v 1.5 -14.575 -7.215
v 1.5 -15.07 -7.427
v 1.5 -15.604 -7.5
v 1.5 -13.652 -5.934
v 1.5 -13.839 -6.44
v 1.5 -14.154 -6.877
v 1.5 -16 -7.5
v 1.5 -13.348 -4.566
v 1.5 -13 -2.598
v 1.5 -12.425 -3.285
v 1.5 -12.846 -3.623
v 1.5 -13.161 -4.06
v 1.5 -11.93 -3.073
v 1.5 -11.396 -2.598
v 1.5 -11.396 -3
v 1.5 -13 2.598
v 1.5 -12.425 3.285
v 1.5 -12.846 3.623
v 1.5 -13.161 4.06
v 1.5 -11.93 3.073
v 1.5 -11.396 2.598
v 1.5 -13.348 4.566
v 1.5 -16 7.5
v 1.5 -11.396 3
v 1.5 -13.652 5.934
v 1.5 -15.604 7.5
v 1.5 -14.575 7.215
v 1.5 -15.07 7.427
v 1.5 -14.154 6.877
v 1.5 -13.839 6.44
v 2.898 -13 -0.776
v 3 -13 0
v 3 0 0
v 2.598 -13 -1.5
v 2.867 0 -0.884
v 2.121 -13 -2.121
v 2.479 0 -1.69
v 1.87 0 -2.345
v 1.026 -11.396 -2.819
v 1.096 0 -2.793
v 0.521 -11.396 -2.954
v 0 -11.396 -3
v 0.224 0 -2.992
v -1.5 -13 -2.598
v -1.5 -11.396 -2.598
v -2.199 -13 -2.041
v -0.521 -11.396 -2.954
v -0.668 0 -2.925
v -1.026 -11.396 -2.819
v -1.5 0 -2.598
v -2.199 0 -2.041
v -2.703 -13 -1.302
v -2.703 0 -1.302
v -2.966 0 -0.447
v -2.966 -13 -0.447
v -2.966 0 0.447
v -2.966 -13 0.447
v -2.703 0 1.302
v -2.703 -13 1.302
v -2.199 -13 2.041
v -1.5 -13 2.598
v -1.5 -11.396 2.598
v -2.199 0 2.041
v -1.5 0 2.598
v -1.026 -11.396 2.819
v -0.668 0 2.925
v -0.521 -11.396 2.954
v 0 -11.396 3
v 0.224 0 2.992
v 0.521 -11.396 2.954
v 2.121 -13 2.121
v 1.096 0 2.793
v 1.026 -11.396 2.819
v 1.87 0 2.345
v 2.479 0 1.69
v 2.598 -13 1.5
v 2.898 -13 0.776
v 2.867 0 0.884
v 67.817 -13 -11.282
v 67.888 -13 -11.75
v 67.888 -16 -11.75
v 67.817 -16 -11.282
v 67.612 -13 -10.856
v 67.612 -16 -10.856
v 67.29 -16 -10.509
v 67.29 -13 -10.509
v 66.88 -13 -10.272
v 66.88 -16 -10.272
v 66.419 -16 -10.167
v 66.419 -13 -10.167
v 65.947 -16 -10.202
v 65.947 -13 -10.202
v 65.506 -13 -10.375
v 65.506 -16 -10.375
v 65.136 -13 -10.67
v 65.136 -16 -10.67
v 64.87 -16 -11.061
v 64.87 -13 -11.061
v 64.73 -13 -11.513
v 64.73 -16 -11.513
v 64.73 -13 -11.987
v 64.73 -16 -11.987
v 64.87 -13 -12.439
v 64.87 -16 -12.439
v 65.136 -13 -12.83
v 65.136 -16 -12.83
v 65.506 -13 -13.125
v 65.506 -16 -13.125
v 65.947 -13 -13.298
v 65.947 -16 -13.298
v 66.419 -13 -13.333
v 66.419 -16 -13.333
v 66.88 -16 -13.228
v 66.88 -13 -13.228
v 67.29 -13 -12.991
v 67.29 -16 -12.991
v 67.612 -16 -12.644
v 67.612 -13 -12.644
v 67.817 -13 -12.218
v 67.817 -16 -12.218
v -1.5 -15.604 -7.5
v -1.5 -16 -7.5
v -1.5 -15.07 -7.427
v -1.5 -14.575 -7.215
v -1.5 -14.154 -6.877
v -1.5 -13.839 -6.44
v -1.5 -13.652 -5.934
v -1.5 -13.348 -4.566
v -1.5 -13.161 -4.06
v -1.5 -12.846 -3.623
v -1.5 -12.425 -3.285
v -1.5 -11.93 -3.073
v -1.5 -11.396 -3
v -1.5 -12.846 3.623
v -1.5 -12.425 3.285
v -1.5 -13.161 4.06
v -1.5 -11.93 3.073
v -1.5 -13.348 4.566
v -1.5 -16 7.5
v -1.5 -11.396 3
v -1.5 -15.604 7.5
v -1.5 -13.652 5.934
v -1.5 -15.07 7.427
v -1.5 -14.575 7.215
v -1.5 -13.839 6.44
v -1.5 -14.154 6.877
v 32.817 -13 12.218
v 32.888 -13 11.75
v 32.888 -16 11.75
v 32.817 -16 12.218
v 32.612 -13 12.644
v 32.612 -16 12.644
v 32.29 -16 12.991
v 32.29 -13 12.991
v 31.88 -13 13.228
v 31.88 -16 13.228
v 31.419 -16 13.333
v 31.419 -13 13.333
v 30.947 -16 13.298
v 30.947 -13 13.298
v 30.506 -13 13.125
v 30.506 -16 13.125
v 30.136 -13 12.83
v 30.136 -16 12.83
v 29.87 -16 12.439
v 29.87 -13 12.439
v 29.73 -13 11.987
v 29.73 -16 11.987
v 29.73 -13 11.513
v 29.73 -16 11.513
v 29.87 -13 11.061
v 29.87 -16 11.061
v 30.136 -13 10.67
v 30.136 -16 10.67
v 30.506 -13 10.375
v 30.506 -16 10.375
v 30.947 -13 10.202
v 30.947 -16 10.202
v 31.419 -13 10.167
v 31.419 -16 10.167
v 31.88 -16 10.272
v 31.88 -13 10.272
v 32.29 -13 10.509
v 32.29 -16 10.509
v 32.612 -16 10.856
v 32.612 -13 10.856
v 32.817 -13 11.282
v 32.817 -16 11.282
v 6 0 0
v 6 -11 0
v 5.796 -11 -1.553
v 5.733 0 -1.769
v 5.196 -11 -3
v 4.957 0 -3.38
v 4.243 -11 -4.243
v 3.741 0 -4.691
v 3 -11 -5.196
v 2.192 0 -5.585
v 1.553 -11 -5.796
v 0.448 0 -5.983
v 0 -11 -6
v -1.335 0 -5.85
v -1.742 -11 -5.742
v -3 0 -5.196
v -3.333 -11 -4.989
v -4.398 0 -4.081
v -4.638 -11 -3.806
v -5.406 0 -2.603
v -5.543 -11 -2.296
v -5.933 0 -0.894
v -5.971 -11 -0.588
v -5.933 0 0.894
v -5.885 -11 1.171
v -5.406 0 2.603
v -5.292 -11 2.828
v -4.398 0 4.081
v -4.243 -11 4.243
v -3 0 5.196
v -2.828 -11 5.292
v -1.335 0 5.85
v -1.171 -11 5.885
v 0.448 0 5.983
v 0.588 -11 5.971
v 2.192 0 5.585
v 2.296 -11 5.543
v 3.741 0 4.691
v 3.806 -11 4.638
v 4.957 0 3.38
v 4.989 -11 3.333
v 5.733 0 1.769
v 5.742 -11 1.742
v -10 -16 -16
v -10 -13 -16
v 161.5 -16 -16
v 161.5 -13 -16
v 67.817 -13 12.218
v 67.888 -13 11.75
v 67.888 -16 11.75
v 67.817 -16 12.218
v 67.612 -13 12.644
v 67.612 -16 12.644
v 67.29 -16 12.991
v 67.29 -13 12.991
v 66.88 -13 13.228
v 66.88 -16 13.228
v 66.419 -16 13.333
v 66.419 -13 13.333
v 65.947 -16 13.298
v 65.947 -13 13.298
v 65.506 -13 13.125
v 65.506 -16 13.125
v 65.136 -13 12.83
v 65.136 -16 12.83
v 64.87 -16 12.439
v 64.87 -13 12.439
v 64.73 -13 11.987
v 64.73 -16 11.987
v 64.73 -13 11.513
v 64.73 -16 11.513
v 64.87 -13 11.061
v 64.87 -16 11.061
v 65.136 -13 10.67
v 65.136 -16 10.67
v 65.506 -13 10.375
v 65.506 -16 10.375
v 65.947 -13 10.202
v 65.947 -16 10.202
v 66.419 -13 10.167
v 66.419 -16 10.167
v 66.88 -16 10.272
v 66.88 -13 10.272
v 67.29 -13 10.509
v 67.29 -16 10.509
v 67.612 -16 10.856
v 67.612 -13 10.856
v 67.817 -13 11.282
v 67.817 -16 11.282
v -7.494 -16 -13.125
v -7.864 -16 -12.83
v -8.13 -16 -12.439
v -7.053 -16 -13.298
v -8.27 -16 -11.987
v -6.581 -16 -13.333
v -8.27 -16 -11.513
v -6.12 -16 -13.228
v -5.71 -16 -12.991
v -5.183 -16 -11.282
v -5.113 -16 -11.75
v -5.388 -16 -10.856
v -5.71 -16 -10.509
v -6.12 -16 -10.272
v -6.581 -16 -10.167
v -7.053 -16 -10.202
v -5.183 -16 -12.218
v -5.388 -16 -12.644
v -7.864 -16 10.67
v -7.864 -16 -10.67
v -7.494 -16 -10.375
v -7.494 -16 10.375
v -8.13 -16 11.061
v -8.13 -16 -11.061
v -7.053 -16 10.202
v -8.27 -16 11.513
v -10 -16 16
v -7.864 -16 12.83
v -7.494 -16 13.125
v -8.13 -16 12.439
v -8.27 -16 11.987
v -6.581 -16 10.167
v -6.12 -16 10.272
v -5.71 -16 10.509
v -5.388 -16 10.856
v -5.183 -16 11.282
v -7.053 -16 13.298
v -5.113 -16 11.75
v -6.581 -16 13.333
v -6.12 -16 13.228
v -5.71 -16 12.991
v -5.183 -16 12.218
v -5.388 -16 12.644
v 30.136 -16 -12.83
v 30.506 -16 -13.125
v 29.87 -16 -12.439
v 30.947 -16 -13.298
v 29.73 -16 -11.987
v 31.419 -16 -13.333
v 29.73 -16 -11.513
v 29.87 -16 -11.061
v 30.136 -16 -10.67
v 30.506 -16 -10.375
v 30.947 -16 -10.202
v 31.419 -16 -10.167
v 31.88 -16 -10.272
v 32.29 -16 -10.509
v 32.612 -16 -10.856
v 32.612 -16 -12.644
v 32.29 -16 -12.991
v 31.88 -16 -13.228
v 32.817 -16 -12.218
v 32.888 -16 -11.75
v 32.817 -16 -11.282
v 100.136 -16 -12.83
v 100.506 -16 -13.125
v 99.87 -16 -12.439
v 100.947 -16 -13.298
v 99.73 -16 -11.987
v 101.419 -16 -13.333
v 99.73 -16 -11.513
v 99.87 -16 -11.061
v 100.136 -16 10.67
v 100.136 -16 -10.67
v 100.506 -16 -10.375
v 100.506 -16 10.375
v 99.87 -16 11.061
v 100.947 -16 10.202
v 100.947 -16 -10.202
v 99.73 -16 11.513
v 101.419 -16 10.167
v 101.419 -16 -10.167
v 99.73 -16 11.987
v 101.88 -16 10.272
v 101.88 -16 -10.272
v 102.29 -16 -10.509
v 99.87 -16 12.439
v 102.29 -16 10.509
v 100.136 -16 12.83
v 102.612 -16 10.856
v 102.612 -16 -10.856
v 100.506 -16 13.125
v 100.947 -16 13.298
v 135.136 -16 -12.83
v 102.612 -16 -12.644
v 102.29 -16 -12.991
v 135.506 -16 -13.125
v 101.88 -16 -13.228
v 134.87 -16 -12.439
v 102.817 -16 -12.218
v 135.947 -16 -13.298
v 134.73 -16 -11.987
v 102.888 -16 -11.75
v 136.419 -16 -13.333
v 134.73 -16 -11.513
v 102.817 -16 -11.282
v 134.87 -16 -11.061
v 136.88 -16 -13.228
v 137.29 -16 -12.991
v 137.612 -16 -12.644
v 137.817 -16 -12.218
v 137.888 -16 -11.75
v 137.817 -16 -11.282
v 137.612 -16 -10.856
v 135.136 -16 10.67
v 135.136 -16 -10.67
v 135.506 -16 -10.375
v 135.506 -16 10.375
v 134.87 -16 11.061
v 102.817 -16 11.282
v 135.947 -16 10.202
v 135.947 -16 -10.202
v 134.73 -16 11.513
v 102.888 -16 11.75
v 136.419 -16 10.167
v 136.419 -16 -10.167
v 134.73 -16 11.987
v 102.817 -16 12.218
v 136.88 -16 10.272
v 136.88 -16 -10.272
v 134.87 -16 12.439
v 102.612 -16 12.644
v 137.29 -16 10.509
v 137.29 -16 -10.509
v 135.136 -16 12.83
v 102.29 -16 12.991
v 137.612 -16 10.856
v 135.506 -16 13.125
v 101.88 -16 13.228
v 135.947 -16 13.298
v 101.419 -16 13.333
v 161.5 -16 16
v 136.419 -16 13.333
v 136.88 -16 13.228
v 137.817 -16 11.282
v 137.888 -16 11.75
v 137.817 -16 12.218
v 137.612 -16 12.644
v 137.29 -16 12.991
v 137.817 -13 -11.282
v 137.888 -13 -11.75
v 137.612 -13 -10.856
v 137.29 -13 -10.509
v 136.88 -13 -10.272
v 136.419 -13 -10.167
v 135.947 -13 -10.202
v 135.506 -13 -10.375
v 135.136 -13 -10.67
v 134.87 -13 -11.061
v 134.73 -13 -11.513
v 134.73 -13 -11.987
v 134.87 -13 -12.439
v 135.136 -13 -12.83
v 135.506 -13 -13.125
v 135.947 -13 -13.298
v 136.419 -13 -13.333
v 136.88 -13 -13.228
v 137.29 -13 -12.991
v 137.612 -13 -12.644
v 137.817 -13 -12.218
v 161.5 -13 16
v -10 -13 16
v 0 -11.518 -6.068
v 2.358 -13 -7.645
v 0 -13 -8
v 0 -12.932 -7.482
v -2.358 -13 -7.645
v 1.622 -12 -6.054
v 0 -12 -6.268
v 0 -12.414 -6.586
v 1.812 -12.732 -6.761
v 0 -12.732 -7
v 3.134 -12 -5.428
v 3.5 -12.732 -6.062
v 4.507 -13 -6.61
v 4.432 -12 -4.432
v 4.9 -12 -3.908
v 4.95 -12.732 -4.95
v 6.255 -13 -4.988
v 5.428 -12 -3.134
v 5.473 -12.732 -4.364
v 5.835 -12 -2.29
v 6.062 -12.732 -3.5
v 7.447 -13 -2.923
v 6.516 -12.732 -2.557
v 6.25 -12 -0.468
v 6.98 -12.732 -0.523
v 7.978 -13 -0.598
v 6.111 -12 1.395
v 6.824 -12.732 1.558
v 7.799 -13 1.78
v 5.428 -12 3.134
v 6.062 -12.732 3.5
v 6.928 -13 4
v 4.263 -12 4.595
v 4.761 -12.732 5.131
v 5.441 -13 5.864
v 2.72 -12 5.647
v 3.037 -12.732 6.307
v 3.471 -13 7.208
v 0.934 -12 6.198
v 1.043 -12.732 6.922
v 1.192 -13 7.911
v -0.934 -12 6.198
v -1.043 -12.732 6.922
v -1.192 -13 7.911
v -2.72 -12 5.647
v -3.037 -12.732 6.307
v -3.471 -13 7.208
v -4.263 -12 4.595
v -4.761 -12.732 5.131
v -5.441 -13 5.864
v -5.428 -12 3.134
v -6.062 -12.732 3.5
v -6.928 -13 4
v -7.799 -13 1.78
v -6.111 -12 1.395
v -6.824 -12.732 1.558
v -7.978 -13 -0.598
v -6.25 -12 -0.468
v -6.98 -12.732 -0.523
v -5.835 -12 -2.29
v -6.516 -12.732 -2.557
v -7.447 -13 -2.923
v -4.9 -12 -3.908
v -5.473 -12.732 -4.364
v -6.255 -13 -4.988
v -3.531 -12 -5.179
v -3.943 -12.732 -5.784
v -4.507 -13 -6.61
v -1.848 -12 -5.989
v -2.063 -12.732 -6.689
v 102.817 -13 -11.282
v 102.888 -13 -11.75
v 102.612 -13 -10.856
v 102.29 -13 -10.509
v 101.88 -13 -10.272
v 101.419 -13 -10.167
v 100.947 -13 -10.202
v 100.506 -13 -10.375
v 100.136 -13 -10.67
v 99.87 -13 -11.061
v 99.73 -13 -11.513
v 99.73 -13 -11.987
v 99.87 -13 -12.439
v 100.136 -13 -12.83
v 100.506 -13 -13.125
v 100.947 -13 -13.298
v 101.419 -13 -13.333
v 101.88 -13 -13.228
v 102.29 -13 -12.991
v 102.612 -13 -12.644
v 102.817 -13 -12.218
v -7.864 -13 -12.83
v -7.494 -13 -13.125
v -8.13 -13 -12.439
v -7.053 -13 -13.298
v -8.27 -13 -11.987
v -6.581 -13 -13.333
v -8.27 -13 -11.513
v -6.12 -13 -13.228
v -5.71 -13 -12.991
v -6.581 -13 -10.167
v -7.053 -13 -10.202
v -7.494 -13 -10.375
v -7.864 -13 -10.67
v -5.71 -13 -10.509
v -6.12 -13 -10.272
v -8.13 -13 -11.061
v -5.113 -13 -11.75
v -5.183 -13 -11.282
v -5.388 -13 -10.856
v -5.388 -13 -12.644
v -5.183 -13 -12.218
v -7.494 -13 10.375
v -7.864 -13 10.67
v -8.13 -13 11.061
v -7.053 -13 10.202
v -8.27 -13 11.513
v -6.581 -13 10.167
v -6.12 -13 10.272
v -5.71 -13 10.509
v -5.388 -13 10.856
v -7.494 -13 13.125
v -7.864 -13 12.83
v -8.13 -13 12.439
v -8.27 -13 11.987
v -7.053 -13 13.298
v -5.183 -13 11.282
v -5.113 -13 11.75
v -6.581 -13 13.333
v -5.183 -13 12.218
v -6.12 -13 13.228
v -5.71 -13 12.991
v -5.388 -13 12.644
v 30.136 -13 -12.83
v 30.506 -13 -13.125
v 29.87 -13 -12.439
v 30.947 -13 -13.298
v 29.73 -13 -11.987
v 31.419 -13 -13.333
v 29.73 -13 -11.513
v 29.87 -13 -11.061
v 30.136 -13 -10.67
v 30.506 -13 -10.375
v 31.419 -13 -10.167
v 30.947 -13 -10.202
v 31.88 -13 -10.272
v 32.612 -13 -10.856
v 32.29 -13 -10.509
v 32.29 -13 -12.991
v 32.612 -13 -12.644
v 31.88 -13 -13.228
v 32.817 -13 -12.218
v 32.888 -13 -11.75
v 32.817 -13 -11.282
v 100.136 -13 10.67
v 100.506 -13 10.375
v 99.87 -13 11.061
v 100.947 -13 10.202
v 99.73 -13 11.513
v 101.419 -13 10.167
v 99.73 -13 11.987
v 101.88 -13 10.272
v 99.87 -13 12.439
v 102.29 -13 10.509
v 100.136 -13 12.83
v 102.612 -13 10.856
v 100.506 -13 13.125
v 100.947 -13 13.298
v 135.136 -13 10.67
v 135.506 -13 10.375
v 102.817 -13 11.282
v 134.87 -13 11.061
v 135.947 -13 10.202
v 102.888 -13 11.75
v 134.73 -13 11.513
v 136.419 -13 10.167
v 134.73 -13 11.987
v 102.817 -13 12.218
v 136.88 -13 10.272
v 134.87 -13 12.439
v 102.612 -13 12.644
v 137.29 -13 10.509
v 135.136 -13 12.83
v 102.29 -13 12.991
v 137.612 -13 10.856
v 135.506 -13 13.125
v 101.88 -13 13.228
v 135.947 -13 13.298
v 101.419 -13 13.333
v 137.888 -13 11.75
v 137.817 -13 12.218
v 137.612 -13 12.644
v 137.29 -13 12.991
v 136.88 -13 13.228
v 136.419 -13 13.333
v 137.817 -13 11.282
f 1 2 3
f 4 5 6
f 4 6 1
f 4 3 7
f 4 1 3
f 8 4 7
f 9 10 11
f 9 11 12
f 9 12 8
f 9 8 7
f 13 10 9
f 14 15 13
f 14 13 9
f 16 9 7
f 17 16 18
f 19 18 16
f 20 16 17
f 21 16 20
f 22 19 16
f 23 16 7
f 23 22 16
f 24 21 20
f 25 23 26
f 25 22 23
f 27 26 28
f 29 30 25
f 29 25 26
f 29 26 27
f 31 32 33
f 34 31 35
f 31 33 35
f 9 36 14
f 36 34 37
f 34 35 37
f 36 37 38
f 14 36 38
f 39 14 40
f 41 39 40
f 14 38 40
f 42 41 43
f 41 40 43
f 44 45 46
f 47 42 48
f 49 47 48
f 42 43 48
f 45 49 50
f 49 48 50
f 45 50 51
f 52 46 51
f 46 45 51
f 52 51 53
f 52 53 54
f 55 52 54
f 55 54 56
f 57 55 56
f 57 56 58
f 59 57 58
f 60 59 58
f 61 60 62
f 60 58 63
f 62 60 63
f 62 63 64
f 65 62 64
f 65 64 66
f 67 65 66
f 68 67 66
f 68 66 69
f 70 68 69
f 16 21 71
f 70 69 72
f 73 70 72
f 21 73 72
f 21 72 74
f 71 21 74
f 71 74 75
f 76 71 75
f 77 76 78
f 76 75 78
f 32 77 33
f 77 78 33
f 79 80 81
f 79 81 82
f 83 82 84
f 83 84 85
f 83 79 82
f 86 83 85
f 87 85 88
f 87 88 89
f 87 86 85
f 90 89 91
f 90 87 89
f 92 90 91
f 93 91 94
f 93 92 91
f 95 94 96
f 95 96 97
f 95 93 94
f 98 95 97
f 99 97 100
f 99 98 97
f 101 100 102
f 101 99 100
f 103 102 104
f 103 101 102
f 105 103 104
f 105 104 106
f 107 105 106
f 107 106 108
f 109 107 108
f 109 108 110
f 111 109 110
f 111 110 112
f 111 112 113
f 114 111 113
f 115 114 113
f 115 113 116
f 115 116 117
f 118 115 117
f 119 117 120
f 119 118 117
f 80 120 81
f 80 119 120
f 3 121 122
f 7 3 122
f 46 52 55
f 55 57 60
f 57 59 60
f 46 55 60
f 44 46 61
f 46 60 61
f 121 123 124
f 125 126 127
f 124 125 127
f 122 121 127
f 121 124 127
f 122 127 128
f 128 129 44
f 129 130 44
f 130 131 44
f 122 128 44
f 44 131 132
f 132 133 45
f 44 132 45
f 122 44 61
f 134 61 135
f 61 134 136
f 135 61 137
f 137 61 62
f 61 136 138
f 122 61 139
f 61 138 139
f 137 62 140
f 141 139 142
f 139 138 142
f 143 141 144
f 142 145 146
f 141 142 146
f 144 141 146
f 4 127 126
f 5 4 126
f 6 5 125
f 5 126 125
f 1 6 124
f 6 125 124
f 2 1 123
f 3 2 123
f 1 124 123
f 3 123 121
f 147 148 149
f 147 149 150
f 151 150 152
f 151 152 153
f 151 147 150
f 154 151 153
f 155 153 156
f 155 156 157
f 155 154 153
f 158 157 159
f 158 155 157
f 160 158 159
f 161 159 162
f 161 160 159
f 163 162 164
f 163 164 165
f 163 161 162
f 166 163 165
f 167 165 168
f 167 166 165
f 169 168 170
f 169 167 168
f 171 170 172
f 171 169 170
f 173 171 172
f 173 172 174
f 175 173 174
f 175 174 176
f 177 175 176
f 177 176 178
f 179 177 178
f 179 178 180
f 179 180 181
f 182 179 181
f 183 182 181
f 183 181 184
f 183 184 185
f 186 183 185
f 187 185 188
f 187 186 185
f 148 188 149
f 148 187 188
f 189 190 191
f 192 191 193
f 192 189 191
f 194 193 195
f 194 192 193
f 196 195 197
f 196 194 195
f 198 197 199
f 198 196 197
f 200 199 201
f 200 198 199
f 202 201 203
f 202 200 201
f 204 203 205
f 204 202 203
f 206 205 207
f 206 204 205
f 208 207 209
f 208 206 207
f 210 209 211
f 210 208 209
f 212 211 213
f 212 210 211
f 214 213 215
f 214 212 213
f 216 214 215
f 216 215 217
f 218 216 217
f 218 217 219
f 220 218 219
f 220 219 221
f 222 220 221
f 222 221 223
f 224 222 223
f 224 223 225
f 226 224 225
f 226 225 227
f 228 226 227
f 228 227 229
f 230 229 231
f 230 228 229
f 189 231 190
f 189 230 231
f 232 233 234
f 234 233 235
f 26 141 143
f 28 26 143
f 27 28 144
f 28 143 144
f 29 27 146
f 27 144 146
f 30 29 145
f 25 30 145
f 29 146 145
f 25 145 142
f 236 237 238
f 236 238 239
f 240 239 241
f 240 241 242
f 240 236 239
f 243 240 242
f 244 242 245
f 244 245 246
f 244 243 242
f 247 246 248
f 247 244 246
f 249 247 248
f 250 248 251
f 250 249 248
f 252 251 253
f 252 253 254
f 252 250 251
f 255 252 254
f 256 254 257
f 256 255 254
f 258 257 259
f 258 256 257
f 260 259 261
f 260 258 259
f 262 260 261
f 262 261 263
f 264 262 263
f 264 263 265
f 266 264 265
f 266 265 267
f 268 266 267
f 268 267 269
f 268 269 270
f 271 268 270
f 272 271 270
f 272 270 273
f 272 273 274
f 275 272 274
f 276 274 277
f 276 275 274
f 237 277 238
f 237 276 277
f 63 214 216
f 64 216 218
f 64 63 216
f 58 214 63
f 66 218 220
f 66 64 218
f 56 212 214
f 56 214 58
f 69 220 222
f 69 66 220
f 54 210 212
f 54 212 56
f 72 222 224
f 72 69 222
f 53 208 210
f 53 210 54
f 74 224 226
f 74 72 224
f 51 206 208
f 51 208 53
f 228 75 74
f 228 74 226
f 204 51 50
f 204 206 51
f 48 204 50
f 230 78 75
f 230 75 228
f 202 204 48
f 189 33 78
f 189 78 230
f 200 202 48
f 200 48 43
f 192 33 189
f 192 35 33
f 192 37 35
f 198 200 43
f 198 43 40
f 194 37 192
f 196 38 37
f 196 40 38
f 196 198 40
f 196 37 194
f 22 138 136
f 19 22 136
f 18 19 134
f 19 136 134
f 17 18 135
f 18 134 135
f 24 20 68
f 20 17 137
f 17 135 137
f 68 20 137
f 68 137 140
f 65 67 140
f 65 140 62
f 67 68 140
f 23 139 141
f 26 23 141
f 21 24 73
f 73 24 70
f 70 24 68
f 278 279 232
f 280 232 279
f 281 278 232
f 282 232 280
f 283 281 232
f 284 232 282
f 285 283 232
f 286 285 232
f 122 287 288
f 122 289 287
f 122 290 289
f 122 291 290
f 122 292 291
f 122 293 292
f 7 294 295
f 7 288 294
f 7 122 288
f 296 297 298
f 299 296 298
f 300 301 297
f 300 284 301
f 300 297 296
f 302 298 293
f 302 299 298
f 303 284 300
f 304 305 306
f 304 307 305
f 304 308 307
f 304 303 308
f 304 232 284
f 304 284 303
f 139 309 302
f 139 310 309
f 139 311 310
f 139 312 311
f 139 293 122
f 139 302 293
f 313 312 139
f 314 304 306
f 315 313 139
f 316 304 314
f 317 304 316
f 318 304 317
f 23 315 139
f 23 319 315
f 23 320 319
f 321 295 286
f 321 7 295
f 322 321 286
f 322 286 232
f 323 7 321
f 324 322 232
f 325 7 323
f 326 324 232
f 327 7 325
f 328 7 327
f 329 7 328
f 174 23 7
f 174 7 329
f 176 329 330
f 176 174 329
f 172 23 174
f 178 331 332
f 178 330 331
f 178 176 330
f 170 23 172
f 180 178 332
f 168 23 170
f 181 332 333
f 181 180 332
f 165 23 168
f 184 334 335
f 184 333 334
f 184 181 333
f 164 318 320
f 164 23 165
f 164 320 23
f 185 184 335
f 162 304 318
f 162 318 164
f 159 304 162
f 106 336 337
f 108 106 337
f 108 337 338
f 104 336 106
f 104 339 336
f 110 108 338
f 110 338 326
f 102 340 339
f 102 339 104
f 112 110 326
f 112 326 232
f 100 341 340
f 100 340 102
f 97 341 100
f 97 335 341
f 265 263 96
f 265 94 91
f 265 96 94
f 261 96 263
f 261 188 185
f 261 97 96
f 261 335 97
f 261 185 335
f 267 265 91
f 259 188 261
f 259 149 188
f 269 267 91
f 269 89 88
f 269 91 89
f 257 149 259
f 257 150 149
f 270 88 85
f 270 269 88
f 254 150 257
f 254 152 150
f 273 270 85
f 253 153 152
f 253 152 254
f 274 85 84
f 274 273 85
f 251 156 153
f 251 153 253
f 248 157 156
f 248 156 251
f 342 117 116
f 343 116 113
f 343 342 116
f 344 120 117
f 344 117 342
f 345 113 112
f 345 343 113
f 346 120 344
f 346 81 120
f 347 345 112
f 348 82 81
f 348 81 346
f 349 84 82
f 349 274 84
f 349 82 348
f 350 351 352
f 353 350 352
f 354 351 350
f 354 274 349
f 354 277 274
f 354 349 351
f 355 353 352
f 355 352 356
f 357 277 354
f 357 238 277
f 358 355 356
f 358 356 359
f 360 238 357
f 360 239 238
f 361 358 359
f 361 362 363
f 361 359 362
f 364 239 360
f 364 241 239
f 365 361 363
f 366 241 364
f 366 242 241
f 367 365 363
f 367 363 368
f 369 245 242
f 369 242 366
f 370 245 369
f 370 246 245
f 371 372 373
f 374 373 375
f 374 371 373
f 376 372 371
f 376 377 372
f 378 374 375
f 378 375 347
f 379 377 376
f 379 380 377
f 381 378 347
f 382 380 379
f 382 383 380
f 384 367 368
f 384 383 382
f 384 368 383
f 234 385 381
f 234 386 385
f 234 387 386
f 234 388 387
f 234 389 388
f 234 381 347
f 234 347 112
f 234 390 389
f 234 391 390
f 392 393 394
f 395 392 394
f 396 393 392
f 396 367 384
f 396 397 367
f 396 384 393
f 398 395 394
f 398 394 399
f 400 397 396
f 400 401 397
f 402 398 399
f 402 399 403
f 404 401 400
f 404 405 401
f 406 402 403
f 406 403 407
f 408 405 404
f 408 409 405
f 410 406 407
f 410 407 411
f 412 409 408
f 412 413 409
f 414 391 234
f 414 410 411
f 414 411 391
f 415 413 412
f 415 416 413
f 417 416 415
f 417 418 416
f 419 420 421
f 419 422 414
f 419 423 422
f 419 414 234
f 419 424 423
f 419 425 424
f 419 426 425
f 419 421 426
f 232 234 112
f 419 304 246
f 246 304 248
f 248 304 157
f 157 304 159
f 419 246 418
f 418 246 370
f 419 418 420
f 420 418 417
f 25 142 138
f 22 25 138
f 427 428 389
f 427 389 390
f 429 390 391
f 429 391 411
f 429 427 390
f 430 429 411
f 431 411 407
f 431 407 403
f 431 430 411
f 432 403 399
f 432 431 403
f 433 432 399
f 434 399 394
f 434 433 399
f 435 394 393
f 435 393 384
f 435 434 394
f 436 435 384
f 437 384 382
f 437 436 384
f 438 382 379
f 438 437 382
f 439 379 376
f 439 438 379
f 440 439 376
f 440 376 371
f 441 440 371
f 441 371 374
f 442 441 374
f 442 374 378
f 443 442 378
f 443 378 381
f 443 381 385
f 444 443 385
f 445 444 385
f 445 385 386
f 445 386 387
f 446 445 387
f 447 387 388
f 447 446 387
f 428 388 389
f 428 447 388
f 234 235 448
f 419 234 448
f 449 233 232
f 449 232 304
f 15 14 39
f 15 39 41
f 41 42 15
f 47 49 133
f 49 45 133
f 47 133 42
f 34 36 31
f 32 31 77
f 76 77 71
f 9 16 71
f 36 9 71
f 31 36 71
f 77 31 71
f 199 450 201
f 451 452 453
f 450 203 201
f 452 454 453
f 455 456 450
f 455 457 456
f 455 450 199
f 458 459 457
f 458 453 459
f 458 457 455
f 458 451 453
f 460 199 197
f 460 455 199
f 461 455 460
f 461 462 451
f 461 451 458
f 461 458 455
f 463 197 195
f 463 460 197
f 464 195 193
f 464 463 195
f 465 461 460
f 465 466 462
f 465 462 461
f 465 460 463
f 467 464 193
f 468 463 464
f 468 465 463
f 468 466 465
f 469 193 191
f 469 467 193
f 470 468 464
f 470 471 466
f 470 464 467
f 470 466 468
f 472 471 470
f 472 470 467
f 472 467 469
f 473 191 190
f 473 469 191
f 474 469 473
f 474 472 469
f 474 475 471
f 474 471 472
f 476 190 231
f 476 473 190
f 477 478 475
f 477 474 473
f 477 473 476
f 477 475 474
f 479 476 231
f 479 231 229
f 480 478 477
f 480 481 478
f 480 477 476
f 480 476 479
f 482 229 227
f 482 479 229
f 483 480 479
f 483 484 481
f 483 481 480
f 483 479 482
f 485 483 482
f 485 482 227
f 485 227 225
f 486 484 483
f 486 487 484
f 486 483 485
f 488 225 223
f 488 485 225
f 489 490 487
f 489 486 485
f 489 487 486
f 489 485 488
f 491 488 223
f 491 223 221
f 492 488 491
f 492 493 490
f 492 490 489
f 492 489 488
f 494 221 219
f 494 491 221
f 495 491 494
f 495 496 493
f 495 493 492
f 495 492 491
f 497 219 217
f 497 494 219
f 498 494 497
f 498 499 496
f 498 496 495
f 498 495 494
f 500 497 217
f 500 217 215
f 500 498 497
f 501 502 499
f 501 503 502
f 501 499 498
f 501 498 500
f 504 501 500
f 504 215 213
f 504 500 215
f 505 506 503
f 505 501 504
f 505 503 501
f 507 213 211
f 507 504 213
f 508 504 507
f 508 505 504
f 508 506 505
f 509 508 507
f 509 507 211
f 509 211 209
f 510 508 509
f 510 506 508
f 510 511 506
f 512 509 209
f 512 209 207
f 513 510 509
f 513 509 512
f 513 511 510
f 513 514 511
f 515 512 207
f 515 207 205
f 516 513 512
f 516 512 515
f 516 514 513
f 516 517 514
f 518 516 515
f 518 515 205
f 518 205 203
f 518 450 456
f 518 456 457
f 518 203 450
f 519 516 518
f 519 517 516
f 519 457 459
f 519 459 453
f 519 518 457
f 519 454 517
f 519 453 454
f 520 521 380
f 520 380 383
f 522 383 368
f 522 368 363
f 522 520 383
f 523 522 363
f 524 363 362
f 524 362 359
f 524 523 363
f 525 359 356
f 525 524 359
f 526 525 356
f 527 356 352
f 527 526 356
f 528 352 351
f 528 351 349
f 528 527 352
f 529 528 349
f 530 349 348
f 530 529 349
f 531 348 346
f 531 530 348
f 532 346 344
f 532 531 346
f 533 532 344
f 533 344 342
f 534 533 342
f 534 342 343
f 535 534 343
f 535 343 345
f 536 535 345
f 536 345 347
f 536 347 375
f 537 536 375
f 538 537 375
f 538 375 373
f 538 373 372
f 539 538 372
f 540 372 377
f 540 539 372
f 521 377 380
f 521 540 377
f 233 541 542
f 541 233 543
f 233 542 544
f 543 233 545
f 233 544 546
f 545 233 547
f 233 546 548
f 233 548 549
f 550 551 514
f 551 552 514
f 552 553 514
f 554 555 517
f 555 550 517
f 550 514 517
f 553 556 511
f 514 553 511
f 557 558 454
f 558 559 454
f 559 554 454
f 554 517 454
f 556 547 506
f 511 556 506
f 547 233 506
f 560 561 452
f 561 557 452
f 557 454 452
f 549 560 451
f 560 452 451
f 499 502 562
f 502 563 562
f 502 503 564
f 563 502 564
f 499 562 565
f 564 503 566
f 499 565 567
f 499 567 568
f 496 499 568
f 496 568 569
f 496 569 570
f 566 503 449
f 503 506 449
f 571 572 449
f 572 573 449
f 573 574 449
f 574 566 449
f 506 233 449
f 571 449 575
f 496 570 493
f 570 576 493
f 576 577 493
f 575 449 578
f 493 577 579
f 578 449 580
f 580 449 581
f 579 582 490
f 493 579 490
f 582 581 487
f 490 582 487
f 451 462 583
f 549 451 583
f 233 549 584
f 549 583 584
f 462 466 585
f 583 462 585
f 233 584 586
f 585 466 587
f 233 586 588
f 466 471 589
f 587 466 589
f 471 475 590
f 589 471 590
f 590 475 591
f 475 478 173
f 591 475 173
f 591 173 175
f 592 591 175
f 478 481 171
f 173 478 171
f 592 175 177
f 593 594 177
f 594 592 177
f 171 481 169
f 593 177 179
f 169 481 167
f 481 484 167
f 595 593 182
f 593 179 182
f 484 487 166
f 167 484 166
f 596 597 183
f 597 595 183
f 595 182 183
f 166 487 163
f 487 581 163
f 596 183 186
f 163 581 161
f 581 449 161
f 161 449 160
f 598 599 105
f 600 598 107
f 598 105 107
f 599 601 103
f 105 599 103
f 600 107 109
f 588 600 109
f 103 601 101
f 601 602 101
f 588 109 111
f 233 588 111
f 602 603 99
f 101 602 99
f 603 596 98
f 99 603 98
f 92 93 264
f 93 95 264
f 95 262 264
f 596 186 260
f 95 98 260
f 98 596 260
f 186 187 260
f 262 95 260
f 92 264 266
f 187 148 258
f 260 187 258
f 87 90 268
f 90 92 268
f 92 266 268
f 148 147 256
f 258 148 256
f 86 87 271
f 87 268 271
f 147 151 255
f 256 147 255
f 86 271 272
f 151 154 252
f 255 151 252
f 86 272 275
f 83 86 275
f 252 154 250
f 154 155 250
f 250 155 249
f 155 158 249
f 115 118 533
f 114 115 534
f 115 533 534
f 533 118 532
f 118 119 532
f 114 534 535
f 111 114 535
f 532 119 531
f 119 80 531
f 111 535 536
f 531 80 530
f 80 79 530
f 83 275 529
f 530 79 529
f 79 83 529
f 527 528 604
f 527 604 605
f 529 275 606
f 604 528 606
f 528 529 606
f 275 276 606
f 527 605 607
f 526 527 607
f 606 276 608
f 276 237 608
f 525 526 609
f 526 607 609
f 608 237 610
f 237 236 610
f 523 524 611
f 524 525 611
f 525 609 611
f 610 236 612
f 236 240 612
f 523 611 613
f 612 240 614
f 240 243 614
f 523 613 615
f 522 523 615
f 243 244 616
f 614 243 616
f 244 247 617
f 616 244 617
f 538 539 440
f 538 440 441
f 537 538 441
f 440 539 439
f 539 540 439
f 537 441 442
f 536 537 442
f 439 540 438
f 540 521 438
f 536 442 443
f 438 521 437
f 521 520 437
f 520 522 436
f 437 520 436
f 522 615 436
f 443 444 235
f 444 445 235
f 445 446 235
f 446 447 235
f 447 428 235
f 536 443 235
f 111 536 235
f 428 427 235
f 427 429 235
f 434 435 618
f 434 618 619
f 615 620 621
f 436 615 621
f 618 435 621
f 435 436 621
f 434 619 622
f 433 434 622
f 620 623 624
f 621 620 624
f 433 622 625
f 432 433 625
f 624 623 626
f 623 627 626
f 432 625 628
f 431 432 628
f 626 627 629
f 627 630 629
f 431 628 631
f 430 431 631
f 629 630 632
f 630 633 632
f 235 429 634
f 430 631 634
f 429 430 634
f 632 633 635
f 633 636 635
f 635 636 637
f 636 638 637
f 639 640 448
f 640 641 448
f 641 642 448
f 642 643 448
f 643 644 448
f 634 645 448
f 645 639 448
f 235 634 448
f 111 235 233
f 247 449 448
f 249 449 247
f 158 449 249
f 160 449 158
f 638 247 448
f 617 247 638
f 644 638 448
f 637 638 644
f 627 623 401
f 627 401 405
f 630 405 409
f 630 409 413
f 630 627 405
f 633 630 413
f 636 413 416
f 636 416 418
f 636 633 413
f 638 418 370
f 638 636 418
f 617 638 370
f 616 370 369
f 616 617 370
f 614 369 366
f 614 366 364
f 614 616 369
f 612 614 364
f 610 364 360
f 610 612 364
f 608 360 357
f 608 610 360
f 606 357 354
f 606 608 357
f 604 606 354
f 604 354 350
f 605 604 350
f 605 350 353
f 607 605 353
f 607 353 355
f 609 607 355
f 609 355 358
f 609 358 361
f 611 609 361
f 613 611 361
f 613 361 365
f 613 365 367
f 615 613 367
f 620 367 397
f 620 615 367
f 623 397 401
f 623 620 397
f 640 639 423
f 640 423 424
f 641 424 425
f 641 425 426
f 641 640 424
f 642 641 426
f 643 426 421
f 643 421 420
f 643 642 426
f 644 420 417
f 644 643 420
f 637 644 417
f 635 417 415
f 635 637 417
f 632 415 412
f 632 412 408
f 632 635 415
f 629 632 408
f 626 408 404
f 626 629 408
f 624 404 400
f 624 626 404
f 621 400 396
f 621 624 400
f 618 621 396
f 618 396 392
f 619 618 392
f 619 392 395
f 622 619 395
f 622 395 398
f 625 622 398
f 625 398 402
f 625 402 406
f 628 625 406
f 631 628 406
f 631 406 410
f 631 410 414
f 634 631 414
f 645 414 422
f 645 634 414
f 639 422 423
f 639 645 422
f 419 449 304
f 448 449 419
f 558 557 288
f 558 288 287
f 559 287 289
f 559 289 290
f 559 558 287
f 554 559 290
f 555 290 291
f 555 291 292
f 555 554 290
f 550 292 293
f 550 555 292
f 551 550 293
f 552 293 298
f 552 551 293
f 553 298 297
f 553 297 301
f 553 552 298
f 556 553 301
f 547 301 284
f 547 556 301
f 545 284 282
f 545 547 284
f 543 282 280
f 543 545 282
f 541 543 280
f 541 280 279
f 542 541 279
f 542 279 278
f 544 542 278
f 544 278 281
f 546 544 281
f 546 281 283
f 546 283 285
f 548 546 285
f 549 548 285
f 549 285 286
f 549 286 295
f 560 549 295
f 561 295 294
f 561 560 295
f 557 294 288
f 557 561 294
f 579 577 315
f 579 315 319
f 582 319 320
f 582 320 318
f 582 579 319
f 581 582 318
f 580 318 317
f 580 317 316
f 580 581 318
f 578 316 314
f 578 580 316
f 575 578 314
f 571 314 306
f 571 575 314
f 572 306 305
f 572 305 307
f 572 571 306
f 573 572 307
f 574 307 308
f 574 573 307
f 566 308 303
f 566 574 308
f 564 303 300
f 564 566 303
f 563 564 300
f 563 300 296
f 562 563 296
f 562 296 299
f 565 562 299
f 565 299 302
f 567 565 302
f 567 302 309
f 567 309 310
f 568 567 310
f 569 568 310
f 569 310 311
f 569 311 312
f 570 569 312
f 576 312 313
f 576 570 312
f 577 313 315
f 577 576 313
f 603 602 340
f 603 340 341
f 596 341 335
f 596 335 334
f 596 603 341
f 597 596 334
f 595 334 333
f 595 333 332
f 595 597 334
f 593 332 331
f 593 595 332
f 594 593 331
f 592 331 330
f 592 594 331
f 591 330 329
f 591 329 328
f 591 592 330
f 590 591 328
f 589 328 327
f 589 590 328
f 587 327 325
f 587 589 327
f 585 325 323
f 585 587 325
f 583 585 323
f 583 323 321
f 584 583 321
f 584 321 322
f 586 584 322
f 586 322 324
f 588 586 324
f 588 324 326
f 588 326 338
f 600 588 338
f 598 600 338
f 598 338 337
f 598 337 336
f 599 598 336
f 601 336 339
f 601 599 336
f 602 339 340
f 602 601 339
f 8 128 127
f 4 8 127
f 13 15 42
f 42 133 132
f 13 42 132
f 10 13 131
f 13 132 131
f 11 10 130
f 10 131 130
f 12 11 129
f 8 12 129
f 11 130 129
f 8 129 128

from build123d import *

# Parameters (mm, degrees)
SKETCH1_R           = 6
SKETCH1_R_2         = 3
BOSS_EXTRUDE1_DEPTH = 13
SKETCH2_W           = 171.5
SKETCH2_H           = 32
SKETCH2_R           = 1.5875
BOSS_EXTRUDE2_DEPTH = 3
CUT_EXTRUDE1_DEPTH  = 1.5


with BuildPart() as part:
    # Sketch1 → Boss-Extrude1 (new body)
    with BuildSketch(Plane(origin=(0, 0, 0), x_dir=(1, 0, 0), z_dir=(0, 1, 0))):
        Circle(SKETCH1_R)
        Circle(SKETCH1_R_2, mode=Mode.SUBTRACT)
    extrude(amount=-BOSS_EXTRUDE1_DEPTH)


with BuildPart() as body_2:
    # Sketch2 → Boss-Extrude2 (new body)
    with BuildSketch(Plane.XZ.offset(13)):
        with Locations((75.75, 0)):
            Rectangle(SKETCH2_W, SKETCH2_H)
        with Locations((136.3, -11.75)):
            Circle(SKETCH2_R, mode=Mode.SUBTRACT)
        with Locations((136.3, 11.75)):
            Circle(SKETCH2_R, mode=Mode.SUBTRACT)
        with Locations((101.3, -11.75)):
            Circle(SKETCH2_R, mode=Mode.SUBTRACT)
        with Locations((66.3, -11.75)):
            Circle(SKETCH2_R, mode=Mode.SUBTRACT)
        with Locations((31.3, -11.75)):
            Circle(SKETCH2_R, mode=Mode.SUBTRACT)
        with Locations((101.3, 11.75)):
            Circle(SKETCH2_R, mode=Mode.SUBTRACT)
        with Locations((66.3, 11.75)):
            Circle(SKETCH2_R, mode=Mode.SUBTRACT)
        with Locations((31.3, 11.75)):
            Circle(SKETCH2_R, mode=Mode.SUBTRACT)
        with Locations((-6.7, 11.75)):
            Circle(SKETCH2_R, mode=Mode.SUBTRACT)
        with Locations((-6.7, -11.75)):
            Circle(SKETCH2_R, mode=Mode.SUBTRACT)
    extrude(amount=BOSS_EXTRUDE2_DEPTH)


with BuildPart() as cut_extrude1_tool:
    # Sketch7 → Cut-Extrude1 (new body, symmetric)
    with BuildSketch(Plane.ZY):
        with BuildLine():
            ThreePointArc((-3, -11.395656787), (-3.439916375, -12.647111574), (-4.566139084, -13.348030908))
            Line((-4.566139084, -13.348030908), (-5.933860916, -13.651969092))
            ThreePointArc((-5.933860916, -13.651969092), (-7.060083625, -14.352888426), (-7.5, -15.604343213))
            Line((-7.5, -15.604343213), (-7.5, -16))
            Line((-7.5, -16), (7.5, -16))
            Line((7.5, -16), (7.5, -15.604343213))
            ThreePointArc((7.5, -15.604343213), (7.060083625, -14.352888426), (5.933860916, -13.651969092))
            Line((5.933860916, -13.651969092), (4.566139084, -13.348030908))
            ThreePointArc((4.566139084, -13.348030908), (3.439916375, -12.647111574), (3, -11.395656787))
            Line((3, -11.395656787), (-3, -11.395656787))
        make_face()
    extrude(amount=CUT_EXTRUDE1_DEPTH, both=True)


with BuildPart() as part_1:
    add(part.part)

    # Cut-Extrude1: cut by cut_extrude1_tool
    add(cut_extrude1_tool.part, mode=Mode.SUBTRACT)



with BuildPart() as body_2_1:
    add(body_2.part)

    # Cut-Extrude1: cut by cut_extrude1_tool
    add(cut_extrude1_tool.part, mode=Mode.SUBTRACT)


with BuildPart() as part_2:
    add(part_1.part)

    add(body_2_1.part)  # Revolve1 merges body 2
    # Sketch8 → Revolve1 (revolve)
    with BuildSketch(Plane.ZY):
        with BuildLine():
            Line((-8, -13), (-6, -13))
            Line((-6, -13), (-6, -11))
            ThreePointArc((-6, -11), (-6.585786438, -12.414213562), (-8, -13))
        make_face()
    revolve(axis=Axis((0, 4.095579303, 0), (0, -1, 0)))


solid = part_2.part
